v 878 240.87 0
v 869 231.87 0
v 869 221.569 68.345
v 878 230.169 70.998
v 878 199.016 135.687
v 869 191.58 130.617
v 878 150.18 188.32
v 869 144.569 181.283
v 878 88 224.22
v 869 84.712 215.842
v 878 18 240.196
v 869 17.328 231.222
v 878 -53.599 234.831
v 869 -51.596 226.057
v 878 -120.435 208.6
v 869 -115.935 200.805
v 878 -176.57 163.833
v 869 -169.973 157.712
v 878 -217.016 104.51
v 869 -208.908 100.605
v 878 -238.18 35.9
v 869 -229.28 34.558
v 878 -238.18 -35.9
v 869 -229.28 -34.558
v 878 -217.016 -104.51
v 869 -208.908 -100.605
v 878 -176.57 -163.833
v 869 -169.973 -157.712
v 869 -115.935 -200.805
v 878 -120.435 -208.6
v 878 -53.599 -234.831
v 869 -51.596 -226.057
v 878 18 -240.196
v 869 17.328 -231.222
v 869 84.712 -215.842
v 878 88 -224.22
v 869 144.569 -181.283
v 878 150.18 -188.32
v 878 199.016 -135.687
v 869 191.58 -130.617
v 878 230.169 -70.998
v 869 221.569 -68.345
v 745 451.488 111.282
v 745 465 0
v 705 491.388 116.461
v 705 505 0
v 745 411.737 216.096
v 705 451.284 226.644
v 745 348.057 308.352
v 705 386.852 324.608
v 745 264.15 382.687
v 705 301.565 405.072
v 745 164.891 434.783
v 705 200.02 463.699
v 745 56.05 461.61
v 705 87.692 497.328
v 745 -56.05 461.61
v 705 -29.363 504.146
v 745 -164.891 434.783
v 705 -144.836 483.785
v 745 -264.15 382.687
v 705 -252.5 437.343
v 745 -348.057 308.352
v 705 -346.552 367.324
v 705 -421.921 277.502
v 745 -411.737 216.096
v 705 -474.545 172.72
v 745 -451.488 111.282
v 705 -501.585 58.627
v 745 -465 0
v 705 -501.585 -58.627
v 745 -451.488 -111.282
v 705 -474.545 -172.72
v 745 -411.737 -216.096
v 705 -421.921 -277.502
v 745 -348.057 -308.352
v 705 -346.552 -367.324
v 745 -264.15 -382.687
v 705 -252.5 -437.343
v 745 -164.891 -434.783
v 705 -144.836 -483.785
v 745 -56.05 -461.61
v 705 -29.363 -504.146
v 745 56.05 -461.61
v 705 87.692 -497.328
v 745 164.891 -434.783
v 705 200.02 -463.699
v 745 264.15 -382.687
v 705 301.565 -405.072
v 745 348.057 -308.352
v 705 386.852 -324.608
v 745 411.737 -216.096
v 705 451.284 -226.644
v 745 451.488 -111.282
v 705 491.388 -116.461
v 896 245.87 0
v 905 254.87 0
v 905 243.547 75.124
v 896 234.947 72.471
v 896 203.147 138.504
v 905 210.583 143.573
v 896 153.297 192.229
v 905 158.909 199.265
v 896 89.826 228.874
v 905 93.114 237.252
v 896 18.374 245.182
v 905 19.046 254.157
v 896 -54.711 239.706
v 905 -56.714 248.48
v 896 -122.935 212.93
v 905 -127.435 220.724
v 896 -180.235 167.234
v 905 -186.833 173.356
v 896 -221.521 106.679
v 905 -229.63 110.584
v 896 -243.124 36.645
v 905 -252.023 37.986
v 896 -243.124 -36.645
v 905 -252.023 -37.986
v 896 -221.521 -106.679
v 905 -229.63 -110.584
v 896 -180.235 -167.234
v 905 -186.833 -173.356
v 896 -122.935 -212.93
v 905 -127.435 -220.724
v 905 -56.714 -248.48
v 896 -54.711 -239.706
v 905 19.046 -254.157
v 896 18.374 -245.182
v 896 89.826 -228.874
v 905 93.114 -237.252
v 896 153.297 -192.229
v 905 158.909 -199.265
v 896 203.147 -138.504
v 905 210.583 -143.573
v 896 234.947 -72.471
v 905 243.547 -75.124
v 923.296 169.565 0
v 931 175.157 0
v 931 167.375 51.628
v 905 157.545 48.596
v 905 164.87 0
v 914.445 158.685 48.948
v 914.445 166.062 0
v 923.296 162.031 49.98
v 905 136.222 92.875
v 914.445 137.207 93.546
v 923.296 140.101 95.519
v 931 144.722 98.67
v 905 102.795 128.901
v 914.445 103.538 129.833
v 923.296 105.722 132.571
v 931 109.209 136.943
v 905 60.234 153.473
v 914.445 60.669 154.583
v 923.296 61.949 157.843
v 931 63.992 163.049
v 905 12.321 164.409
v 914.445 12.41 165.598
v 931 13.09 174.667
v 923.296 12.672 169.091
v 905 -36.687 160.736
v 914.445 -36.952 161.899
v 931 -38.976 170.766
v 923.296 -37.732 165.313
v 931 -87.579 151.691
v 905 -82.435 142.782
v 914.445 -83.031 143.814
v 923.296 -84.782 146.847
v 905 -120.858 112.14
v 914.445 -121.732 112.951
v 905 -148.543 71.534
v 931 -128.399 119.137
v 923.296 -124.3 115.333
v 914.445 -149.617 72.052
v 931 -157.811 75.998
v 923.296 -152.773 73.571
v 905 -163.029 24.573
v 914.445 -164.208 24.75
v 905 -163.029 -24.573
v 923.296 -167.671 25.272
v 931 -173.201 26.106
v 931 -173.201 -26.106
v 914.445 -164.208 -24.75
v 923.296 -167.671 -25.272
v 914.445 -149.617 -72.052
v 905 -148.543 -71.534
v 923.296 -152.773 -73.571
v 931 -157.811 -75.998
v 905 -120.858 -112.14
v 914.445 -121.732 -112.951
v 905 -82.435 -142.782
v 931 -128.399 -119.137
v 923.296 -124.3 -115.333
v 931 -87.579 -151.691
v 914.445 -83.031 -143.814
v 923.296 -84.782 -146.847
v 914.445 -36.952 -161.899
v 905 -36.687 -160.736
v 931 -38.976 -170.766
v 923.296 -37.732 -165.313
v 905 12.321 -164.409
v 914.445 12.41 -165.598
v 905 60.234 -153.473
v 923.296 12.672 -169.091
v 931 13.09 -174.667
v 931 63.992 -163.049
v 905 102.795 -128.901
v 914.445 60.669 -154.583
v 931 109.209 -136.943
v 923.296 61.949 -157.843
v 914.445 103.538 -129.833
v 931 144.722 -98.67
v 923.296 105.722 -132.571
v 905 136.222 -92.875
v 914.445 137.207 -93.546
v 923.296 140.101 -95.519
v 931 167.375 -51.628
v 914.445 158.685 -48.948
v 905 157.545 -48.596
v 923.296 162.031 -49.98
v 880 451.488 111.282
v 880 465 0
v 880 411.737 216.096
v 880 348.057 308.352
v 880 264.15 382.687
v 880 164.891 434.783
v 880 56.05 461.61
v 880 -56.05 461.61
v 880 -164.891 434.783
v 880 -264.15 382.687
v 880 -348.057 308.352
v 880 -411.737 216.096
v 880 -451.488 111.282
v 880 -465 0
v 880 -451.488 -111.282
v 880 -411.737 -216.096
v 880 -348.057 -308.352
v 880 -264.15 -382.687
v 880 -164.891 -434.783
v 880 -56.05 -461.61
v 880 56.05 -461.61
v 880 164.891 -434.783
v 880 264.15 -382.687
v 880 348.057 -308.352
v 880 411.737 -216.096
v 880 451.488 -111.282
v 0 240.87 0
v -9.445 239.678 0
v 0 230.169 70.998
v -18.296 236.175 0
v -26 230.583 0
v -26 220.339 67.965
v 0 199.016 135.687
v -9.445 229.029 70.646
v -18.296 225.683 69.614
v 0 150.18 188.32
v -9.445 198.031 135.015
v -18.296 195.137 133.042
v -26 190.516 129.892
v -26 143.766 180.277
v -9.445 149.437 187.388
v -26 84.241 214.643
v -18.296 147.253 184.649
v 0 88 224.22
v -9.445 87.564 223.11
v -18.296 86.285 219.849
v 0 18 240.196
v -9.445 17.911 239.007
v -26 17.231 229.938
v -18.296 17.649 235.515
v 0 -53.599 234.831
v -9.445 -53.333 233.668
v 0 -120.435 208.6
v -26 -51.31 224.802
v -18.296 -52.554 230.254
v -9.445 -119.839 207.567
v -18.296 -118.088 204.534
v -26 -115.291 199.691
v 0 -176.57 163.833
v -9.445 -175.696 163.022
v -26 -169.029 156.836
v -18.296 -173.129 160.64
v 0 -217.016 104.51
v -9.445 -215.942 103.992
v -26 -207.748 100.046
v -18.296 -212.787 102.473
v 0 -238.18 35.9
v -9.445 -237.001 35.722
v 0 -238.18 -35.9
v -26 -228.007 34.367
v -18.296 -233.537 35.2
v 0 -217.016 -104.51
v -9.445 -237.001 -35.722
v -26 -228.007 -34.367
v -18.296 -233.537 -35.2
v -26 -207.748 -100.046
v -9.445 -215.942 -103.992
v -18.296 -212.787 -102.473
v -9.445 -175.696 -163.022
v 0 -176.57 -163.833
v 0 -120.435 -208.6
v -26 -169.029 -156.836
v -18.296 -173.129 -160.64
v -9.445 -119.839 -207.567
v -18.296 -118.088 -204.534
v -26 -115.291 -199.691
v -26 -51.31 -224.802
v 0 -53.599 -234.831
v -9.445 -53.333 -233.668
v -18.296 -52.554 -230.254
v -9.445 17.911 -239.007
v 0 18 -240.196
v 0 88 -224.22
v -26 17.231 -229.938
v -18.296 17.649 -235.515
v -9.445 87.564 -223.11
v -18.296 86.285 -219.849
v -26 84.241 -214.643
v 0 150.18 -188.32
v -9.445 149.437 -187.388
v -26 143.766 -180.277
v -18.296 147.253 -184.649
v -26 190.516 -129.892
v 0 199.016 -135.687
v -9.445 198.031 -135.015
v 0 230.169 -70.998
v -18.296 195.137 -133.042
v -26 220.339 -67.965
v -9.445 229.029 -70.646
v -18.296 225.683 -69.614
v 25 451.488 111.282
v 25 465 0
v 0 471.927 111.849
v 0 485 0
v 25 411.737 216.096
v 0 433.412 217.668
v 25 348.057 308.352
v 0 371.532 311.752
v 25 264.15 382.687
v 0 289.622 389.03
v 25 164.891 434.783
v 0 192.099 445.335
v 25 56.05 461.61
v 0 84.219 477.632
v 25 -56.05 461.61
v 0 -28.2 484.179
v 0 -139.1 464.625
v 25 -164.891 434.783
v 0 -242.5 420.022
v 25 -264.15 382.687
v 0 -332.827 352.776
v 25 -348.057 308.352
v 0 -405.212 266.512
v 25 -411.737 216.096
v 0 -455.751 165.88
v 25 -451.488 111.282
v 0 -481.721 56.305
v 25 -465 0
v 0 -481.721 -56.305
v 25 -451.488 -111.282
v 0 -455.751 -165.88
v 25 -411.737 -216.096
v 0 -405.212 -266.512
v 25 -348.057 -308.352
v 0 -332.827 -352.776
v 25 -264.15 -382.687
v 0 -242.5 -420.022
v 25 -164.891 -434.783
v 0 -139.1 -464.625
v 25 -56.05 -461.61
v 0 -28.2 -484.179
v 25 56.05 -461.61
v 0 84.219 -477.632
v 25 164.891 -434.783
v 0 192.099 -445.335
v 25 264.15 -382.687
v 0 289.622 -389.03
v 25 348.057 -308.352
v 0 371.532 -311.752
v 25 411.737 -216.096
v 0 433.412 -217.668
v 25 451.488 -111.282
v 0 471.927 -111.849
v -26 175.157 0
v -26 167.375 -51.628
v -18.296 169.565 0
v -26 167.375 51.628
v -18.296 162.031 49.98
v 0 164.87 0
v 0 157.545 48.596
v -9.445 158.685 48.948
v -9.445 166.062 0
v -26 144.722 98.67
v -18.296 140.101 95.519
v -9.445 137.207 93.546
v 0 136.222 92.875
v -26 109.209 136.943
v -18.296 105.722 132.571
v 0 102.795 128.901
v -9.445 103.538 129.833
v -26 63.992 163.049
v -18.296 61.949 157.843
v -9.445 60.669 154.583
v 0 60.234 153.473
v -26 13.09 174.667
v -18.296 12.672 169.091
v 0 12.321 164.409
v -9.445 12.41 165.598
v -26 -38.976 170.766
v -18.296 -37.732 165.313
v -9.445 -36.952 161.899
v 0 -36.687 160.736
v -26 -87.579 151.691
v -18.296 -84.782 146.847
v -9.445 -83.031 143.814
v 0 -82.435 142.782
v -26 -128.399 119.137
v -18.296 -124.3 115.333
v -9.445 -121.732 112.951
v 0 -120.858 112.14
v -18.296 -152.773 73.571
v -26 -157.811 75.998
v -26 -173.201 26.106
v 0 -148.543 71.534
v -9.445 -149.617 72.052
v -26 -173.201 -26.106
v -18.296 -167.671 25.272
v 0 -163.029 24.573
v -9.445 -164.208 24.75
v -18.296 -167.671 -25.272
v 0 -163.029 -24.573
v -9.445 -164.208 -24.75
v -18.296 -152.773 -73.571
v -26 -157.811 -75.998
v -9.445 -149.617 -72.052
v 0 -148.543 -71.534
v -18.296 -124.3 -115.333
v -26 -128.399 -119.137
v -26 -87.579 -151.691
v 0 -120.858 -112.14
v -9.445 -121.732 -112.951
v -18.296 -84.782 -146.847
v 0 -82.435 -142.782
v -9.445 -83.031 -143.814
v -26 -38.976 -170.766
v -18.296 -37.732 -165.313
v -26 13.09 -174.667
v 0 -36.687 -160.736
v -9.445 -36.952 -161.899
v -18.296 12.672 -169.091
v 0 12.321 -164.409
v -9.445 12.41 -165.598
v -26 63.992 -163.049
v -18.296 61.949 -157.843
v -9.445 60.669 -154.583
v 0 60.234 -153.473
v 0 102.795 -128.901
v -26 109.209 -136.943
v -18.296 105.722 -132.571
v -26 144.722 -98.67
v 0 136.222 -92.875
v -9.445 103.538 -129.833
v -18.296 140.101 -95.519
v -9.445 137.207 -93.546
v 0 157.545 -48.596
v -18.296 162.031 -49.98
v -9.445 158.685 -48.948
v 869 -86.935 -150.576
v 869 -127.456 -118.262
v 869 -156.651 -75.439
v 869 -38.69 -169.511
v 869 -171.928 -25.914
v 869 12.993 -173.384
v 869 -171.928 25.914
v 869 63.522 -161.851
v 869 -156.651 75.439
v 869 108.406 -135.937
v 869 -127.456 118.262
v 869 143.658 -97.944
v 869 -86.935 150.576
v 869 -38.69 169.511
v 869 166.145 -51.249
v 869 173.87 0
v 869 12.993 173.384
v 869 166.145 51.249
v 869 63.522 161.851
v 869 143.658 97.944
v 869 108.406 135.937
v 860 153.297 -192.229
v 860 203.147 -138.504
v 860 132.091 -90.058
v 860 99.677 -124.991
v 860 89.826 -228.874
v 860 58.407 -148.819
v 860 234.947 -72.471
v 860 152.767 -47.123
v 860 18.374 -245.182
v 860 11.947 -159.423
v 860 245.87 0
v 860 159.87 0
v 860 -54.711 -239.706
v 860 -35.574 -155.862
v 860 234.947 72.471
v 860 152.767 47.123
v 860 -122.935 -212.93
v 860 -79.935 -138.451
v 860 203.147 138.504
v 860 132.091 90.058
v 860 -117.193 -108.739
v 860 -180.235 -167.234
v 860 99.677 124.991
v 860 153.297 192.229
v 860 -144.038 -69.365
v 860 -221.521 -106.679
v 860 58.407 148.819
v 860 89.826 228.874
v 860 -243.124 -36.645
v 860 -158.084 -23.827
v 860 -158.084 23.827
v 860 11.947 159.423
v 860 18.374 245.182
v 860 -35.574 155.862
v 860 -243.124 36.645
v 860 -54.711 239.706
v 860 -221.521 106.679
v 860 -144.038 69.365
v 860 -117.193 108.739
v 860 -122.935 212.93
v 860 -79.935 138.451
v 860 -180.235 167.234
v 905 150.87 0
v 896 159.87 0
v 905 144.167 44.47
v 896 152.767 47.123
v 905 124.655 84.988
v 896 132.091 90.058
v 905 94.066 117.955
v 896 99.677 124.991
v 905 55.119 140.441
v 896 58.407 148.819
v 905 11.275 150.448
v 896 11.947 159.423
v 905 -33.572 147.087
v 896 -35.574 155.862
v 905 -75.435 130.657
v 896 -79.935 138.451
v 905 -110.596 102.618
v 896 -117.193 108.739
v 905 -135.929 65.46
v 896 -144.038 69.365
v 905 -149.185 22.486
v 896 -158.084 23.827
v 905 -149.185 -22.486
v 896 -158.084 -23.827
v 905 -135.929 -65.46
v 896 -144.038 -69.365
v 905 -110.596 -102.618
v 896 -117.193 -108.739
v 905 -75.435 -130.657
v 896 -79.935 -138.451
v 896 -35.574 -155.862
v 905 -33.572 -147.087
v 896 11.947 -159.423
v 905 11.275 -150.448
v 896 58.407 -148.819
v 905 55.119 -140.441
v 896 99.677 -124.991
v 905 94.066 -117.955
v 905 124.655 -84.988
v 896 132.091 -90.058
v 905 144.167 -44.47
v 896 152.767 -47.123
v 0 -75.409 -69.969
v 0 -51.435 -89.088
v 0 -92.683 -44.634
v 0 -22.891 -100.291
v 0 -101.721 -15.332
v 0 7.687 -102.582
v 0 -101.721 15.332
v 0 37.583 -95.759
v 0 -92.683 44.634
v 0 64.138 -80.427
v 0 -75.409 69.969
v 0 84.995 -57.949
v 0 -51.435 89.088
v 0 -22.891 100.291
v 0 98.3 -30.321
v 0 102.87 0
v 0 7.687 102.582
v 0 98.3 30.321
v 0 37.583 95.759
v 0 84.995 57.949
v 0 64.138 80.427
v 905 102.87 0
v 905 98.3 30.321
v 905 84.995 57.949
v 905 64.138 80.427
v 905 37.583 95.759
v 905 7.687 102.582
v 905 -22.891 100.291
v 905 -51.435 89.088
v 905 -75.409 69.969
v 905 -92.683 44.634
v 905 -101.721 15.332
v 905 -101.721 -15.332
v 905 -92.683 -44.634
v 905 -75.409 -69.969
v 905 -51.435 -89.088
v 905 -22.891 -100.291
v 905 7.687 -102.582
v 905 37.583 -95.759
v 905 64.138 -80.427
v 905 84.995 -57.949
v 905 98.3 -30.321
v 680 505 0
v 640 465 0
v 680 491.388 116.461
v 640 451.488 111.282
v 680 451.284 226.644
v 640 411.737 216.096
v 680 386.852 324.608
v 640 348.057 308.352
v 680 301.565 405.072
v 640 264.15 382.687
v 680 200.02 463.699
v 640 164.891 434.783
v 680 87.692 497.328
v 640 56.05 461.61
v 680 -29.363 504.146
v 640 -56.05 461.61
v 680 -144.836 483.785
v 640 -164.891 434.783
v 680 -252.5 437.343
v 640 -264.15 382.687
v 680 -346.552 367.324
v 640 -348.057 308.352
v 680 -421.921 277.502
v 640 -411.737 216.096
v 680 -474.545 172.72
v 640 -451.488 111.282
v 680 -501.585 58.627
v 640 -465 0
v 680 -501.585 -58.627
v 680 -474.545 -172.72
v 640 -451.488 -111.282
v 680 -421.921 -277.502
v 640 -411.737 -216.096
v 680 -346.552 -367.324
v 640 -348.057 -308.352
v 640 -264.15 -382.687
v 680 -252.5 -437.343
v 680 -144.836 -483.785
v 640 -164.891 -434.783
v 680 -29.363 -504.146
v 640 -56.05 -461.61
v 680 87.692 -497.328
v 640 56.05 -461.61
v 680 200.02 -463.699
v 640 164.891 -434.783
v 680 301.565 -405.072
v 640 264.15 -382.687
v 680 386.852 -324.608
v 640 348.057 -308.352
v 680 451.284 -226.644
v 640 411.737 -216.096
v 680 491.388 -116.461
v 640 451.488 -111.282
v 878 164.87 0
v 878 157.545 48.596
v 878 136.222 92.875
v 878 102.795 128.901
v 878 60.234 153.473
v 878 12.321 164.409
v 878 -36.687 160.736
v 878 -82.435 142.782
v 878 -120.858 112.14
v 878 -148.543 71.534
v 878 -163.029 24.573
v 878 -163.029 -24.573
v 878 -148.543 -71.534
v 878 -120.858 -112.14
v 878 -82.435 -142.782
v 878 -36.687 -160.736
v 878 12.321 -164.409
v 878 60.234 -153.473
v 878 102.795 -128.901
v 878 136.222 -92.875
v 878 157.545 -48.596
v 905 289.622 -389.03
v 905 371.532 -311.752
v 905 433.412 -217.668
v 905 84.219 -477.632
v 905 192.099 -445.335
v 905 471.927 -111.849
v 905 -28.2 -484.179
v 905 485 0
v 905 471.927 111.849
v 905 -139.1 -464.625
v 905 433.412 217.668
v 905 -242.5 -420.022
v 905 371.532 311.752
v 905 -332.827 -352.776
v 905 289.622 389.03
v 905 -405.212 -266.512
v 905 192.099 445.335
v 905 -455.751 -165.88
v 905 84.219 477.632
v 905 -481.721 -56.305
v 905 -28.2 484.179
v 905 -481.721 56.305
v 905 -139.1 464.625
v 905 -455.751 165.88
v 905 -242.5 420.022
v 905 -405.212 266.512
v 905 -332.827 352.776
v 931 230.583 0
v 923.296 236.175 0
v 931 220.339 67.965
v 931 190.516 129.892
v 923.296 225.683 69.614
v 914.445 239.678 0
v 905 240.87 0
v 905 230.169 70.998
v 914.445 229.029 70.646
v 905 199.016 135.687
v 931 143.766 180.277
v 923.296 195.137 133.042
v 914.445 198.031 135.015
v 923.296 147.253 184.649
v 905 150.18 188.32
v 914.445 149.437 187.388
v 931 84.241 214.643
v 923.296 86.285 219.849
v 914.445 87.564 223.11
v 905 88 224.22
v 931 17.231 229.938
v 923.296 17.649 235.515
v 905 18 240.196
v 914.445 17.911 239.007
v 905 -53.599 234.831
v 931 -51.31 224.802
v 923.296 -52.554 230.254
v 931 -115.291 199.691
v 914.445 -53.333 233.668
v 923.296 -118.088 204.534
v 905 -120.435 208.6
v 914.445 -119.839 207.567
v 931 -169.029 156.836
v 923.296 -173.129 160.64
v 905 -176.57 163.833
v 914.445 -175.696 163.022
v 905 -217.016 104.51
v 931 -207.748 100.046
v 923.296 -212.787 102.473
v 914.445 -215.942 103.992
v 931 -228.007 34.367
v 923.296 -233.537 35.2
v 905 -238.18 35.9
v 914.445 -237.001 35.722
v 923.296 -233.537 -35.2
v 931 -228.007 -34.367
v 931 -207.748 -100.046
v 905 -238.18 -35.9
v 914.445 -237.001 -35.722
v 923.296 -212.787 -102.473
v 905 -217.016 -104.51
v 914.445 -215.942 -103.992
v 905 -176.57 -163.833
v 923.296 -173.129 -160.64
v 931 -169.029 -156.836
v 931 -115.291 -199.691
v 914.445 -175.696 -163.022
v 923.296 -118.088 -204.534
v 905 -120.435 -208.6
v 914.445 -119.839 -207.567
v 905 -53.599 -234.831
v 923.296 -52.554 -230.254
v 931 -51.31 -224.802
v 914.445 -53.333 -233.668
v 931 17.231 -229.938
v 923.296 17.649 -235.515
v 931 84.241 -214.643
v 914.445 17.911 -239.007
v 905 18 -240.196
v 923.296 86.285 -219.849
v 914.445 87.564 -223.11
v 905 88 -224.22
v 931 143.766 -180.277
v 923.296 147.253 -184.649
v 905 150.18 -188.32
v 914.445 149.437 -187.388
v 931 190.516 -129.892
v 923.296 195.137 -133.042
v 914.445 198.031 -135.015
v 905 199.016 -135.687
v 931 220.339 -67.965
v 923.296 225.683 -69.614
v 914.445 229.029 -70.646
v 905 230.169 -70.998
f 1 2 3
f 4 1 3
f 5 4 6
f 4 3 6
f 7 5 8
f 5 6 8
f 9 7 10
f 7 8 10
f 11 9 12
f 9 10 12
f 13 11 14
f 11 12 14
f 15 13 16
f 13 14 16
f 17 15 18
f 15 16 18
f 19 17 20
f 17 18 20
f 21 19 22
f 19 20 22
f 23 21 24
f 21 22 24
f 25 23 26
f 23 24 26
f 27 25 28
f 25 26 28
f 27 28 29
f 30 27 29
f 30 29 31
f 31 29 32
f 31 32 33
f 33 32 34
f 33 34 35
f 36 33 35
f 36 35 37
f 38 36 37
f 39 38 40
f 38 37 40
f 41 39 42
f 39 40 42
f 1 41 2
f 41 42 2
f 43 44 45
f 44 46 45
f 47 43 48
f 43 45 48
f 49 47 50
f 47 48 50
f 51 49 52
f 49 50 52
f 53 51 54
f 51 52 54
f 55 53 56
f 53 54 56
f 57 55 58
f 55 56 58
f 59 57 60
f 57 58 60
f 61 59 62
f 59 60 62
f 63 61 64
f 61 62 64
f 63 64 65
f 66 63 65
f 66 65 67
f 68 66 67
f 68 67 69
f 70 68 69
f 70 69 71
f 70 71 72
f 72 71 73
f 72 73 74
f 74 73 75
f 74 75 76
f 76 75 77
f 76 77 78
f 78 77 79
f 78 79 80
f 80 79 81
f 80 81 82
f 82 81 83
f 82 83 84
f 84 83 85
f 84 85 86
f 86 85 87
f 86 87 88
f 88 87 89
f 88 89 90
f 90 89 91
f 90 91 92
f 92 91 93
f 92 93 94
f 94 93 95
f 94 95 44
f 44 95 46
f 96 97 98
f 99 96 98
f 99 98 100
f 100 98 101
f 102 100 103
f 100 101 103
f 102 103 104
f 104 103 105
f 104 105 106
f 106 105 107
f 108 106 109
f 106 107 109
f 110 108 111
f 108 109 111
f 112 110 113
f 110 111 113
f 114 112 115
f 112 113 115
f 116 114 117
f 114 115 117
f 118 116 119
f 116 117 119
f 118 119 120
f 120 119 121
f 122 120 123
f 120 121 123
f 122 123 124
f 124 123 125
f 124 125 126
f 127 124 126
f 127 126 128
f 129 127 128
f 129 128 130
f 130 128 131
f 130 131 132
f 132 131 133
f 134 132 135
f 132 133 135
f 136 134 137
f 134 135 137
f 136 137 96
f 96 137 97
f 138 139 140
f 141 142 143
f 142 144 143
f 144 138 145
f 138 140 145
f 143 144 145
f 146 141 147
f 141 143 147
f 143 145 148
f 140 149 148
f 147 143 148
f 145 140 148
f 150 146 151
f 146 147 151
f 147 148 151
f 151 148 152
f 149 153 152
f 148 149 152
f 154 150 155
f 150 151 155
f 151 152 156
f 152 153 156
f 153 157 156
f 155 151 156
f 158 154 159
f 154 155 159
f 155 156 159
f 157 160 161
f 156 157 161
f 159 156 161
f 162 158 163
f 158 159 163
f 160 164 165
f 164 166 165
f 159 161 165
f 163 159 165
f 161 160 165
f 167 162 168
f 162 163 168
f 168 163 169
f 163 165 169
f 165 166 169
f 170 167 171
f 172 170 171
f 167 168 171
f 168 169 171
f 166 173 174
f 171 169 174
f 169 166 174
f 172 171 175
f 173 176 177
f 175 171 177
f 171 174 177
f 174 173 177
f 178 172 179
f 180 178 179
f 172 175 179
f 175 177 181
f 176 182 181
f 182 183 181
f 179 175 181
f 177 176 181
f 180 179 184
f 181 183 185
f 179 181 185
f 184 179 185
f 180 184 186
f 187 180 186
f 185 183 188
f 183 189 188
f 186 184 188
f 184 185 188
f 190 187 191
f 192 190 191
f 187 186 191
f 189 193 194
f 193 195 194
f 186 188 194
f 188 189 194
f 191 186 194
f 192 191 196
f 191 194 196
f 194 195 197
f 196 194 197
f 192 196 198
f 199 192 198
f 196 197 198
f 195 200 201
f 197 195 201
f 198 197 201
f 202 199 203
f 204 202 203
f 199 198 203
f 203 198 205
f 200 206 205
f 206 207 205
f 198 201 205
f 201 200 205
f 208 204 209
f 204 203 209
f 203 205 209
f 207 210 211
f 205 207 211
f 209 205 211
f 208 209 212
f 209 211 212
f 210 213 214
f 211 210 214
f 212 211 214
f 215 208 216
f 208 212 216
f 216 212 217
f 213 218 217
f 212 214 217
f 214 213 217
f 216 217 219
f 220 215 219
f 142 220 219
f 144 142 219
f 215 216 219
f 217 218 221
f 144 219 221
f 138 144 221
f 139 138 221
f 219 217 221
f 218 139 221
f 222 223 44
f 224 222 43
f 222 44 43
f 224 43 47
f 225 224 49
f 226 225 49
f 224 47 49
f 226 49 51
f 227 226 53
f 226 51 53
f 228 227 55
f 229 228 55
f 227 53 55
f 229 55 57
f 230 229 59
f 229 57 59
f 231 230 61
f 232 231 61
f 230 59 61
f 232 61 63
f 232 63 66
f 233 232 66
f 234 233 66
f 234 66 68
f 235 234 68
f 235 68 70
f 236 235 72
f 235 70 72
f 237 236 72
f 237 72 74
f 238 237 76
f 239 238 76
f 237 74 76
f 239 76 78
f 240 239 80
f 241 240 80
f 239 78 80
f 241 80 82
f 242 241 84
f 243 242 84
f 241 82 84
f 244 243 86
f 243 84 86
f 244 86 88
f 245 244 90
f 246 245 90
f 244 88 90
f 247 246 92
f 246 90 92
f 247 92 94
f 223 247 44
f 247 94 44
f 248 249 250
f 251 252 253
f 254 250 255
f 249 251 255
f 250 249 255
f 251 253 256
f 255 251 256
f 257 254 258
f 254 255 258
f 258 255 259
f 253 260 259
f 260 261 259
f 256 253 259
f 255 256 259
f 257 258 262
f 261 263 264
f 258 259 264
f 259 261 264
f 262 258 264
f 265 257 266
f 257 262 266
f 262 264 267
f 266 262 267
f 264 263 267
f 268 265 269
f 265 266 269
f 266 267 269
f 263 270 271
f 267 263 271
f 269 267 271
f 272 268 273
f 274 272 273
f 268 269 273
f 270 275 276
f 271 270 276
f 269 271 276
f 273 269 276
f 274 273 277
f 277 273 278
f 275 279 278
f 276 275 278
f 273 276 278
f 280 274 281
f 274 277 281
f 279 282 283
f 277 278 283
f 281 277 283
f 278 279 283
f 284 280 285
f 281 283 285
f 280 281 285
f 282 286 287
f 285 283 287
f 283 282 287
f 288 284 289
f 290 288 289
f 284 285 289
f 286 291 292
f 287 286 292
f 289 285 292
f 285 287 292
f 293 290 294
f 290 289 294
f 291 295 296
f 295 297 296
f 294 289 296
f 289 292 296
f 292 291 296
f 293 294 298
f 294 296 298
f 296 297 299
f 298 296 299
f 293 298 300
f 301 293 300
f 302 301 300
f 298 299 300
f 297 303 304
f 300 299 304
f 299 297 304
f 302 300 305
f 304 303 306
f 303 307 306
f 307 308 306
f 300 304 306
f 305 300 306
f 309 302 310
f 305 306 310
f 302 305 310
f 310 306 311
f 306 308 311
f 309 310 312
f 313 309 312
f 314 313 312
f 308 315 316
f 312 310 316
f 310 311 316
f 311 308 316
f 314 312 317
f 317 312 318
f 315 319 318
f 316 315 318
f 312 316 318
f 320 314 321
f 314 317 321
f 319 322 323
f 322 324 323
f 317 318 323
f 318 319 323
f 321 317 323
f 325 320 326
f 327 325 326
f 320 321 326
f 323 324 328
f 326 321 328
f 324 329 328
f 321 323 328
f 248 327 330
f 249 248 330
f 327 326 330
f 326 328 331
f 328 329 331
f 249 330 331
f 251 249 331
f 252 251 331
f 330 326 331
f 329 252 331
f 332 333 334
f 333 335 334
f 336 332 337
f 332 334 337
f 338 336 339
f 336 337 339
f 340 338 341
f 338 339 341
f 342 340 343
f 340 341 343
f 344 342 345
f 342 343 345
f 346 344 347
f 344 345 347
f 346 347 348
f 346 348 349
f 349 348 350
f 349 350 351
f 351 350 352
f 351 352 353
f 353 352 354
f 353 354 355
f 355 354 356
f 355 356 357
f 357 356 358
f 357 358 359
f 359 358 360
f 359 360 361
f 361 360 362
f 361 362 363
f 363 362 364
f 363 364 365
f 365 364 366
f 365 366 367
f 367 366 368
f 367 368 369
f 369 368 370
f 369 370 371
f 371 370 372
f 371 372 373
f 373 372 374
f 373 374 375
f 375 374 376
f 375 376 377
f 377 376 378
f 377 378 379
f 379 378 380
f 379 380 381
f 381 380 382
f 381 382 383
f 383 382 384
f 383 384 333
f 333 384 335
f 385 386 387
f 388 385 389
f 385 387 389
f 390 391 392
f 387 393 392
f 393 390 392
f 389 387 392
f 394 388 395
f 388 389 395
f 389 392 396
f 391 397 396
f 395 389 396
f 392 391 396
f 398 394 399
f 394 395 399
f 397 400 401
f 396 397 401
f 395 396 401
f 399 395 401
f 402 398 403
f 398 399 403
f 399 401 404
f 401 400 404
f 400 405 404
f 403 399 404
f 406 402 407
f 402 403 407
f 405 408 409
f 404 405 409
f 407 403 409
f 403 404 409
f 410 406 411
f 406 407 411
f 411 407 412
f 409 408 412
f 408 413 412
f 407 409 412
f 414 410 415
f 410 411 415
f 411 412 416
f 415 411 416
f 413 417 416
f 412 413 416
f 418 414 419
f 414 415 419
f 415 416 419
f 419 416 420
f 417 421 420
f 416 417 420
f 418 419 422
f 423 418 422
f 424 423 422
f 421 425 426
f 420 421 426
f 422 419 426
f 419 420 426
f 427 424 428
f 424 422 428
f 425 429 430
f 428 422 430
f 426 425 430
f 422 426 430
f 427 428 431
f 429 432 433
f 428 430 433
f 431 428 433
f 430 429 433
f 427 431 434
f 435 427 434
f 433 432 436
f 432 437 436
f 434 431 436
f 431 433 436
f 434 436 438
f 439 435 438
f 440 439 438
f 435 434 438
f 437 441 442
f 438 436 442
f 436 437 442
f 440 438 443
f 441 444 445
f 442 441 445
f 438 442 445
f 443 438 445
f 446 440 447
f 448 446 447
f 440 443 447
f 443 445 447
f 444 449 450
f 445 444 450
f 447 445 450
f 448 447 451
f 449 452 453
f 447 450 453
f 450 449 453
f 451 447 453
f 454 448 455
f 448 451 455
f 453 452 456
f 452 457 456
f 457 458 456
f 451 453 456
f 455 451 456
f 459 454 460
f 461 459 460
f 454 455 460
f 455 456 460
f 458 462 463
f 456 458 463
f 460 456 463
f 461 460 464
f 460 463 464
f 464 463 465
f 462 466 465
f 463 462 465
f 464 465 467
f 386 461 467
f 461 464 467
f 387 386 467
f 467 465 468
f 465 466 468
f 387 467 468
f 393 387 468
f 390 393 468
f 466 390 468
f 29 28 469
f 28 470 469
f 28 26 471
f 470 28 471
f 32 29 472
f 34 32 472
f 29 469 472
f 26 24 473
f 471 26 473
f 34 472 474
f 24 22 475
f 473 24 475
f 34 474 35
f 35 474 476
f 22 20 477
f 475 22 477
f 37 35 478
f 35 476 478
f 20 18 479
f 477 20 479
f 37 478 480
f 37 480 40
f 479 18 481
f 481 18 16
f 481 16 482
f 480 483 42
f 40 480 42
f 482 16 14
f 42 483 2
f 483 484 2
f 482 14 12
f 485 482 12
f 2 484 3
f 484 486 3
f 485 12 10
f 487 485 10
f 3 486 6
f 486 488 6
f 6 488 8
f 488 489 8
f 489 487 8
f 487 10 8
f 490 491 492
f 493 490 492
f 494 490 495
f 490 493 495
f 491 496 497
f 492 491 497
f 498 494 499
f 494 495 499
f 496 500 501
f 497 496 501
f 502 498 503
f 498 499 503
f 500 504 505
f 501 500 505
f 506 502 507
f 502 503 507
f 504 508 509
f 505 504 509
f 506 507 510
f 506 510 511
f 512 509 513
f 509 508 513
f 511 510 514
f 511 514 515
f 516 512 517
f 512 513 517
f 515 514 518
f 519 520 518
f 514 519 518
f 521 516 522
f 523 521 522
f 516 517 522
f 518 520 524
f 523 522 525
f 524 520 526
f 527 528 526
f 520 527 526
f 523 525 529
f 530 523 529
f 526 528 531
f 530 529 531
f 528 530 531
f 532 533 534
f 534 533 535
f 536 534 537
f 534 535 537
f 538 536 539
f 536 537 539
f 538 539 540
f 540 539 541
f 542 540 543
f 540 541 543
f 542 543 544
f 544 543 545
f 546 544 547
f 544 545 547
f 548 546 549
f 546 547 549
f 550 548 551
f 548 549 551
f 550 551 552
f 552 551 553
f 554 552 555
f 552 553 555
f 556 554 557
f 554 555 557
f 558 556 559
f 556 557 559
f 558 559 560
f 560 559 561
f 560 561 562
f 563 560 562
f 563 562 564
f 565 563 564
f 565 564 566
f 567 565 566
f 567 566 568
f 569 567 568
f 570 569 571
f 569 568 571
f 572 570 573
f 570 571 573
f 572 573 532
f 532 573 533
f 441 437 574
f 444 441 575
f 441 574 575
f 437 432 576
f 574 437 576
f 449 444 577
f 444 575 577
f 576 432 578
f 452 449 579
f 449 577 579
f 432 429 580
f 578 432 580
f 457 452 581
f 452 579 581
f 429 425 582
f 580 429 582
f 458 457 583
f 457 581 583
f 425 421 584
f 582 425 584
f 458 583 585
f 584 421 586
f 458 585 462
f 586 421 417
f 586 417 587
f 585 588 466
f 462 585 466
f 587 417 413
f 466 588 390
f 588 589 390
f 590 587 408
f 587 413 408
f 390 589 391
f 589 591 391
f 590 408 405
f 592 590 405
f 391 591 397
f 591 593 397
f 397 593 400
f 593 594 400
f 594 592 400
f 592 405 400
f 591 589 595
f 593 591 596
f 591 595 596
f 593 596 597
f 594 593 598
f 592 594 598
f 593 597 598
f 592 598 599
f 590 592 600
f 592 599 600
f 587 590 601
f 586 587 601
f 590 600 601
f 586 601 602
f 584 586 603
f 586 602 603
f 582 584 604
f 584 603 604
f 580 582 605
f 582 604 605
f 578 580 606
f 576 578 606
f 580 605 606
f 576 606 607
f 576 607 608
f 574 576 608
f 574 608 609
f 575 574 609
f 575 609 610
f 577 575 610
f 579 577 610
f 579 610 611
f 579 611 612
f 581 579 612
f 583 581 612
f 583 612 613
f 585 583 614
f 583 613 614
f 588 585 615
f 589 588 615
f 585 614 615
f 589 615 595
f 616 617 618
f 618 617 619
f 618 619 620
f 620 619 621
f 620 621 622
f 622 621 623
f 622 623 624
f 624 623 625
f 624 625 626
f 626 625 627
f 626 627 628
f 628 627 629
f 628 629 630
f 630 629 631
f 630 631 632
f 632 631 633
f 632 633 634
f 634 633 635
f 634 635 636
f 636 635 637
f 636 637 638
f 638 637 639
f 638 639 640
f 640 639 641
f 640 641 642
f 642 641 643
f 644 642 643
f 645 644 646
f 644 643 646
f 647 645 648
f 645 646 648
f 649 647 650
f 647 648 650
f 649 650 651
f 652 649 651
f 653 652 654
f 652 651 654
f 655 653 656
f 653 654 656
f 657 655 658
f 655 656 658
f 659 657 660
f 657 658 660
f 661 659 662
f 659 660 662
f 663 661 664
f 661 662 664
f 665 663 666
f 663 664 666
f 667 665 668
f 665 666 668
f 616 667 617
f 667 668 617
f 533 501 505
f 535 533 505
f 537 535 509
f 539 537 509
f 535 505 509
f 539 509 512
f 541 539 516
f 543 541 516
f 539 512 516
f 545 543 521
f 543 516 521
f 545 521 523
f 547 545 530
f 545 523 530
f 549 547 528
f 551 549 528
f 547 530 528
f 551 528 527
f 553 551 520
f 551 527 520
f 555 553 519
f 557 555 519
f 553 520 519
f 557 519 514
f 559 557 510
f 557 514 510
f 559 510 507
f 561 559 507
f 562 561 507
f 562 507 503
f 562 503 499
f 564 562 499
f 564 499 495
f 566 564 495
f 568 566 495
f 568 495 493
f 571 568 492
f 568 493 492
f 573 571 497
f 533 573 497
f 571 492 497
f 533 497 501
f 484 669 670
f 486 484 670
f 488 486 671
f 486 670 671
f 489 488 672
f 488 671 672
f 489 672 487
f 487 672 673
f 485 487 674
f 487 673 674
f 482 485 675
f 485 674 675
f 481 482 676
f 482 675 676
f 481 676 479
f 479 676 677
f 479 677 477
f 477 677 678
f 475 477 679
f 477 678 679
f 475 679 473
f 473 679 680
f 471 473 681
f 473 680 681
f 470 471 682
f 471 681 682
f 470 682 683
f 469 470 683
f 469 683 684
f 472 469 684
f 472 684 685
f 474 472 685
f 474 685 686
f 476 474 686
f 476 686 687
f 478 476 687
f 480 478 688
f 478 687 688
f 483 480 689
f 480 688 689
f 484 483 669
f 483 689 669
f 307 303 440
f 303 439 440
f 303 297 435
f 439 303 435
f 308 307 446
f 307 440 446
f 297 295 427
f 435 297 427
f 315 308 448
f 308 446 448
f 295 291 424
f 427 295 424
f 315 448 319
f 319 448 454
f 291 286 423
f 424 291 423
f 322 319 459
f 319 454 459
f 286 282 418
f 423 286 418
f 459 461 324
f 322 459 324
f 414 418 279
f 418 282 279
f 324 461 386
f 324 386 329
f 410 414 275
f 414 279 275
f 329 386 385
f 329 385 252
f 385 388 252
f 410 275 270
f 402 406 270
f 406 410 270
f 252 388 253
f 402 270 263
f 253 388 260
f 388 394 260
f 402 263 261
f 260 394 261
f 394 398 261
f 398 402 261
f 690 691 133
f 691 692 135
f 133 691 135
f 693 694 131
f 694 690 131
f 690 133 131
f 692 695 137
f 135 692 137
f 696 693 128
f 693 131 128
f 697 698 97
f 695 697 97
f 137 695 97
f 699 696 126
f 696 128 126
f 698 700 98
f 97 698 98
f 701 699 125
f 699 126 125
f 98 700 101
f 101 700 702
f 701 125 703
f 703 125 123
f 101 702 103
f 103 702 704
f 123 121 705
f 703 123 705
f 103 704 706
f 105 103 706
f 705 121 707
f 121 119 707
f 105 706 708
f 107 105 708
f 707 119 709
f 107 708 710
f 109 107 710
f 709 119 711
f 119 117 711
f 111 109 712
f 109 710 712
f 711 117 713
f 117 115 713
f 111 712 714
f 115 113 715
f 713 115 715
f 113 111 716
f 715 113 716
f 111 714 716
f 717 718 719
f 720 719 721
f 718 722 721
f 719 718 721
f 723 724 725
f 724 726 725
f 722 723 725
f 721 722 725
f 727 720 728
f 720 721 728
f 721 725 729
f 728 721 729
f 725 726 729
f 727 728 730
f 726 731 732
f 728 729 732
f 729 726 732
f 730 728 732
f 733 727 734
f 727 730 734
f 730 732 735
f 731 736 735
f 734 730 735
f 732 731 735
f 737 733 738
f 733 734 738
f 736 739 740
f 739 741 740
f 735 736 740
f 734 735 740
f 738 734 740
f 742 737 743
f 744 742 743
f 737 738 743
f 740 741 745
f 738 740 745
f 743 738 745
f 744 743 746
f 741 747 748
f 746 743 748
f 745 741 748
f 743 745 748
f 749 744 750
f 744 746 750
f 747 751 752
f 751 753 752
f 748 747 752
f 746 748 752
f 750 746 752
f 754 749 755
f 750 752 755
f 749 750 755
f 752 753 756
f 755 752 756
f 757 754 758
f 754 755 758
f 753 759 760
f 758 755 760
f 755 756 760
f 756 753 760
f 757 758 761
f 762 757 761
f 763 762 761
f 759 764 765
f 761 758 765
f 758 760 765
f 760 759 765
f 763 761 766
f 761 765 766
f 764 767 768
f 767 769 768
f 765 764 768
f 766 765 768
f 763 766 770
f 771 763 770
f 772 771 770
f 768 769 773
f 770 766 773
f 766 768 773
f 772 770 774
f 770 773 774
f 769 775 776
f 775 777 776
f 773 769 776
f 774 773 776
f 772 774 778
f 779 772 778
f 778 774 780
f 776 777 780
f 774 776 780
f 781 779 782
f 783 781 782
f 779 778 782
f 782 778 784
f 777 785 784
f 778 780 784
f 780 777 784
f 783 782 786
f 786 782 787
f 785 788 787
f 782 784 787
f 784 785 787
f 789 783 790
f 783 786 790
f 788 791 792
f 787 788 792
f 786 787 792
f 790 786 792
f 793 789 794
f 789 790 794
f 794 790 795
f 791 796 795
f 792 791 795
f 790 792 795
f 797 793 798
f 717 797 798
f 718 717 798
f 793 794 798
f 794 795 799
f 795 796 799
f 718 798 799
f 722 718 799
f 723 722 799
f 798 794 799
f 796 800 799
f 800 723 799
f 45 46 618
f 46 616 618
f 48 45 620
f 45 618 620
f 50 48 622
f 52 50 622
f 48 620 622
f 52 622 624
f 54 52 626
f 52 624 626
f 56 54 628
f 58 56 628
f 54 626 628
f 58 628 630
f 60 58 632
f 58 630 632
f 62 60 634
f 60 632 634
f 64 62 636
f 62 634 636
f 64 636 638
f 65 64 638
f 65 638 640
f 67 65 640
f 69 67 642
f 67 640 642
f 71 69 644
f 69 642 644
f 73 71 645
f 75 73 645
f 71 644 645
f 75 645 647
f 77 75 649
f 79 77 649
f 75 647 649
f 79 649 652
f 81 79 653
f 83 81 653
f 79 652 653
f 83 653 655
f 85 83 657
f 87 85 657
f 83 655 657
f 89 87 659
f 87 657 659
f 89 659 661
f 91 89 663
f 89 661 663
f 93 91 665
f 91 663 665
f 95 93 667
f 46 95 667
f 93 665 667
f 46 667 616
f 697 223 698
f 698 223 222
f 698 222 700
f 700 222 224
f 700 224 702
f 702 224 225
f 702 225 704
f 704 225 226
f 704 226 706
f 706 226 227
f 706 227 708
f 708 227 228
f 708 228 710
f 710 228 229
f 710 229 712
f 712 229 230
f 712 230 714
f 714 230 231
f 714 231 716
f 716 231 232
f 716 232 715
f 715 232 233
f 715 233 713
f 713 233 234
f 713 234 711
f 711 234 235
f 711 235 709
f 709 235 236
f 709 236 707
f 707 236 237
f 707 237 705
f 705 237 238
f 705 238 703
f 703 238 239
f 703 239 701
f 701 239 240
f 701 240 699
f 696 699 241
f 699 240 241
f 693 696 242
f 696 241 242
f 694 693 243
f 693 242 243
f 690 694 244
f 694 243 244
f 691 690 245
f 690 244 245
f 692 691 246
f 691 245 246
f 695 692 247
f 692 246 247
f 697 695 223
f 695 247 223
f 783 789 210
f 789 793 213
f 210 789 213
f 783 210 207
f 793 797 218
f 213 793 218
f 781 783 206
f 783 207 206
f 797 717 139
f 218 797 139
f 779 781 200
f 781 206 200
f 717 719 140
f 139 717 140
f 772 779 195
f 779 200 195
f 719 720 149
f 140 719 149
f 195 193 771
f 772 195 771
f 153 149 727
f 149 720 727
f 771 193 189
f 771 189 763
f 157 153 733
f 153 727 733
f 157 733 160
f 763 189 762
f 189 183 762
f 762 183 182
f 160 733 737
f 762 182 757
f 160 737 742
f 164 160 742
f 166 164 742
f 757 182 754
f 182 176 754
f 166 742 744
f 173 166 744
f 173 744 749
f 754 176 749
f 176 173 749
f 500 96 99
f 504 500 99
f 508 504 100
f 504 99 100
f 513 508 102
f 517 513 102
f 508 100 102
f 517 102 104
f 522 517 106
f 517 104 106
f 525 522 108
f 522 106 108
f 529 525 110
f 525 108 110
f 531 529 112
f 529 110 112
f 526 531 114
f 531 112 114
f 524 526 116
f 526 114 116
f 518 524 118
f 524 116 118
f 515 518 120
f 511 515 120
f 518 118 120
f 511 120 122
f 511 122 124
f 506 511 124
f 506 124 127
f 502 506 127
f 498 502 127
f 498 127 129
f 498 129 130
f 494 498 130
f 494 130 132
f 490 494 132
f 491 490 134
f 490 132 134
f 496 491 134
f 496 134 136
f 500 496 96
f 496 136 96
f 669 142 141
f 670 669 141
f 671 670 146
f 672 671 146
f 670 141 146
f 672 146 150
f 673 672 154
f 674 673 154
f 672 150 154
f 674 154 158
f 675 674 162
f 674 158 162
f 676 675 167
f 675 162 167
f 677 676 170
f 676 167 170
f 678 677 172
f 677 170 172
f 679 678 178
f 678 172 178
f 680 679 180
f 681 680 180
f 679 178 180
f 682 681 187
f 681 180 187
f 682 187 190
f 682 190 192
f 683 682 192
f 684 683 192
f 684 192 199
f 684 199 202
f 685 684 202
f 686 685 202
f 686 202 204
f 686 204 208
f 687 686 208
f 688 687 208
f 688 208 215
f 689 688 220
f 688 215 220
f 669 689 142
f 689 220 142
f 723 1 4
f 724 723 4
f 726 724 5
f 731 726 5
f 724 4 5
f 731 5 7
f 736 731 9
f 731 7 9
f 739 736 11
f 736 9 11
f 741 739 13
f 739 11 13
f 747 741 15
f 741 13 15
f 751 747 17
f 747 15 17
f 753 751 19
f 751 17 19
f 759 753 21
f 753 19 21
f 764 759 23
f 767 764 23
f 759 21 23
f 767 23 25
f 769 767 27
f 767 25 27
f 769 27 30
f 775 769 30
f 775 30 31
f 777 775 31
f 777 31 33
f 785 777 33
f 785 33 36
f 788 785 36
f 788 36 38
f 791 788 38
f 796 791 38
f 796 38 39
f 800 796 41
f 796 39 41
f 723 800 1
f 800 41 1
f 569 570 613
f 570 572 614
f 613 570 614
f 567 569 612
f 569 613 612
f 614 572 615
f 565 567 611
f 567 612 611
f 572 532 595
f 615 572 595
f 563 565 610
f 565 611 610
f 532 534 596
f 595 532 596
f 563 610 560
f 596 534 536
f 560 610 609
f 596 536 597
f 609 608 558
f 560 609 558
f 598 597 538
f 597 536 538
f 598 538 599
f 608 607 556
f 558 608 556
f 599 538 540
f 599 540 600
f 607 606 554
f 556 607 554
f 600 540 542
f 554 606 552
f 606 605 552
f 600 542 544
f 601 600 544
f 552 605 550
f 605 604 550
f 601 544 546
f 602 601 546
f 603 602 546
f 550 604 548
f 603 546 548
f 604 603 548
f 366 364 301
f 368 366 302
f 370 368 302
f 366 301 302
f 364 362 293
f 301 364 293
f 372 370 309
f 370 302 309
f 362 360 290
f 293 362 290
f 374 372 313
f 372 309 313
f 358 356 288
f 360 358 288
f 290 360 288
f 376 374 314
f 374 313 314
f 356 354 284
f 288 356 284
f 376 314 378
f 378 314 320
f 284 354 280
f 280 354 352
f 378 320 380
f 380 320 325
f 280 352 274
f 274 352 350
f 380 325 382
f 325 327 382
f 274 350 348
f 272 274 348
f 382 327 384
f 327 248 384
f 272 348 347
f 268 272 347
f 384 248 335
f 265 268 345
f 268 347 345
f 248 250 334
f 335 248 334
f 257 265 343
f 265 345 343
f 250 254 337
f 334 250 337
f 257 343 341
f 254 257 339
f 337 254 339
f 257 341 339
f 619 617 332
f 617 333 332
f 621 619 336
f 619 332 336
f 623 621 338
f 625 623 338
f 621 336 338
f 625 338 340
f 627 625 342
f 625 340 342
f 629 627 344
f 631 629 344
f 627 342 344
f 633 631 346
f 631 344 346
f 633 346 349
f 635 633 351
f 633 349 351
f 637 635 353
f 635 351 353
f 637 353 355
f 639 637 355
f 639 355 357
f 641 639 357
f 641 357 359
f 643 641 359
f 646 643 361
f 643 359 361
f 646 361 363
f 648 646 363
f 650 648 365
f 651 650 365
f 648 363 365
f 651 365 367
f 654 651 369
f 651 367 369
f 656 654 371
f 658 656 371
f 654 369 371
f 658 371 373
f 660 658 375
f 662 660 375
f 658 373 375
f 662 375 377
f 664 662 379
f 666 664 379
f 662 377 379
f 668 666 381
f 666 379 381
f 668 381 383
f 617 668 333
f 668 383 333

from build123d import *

# Parameters (mm, degrees)
F2_SIZE = 9


with BuildPart() as f1:
    # F0 (on Top) → F1 (revolve)
    with BuildSketch(Plane.XY):
        with BuildLine():
            Line((0, 164.87), (0, 102.87))
            Line((0, 102.87), (905, 102.87))
            Line((905, 102.87), (905, 159.87))
            Line((905, 159.87), (860, 159.87))
            Line((860, 159.87), (860, 245.87))
            Line((860, 245.87), (905, 245.87))
            Line((905, 245.87), (905, 465))
            Line((905, 465), (905, 485))
            Line((905, 485), (880, 465))
            Line((880, 465), (745, 465))
            Line((745, 465), (705, 505))
            Line((705, 505), (680, 505))
            Line((680, 505), (640, 465))
            Line((640, 465), (25, 465))
            Line((25, 465), (0, 485))
            Line((0, 485), (0, 465))
            Line((0, 465), (0, 240.87))
            ThreePointArc((0, 240.87), (-13.980578, 238.204734), (-26, 230.582813))
            Line((-26, 230.582813), (-26, 175.157187))
            ThreePointArc((-26, 175.157187), (-13.980578, 167.535266), (0, 164.87))
        make_face()
        with BuildLine():
            Line((905, 240.87), (869, 240.87))
            Line((869, 240.87), (869, 164.87))
            Line((869, 164.87), (905, 164.87))
            ThreePointArc((905, 164.87), (918.980578, 167.535266), (931, 175.157187))
            Line((931, 175.157187), (931, 230.582813))
            ThreePointArc((931, 230.582813), (918.980578, 238.204734), (905, 240.87))
        make_face()
    revolve(axis=Axis((352.39023, 0, 0), (1, 0, 0)))

    # F2
    f2_edges = [f1.edges().sort_by_distance(p)[0] for p in [
        (905, -245.87, 0),
        (905, -159.87, 0),
        (869, -240.87, 0),
        (869, -164.87, 0),
    ]]
    chamfer(f2_edges, length=F2_SIZE)


solid = f1.part
